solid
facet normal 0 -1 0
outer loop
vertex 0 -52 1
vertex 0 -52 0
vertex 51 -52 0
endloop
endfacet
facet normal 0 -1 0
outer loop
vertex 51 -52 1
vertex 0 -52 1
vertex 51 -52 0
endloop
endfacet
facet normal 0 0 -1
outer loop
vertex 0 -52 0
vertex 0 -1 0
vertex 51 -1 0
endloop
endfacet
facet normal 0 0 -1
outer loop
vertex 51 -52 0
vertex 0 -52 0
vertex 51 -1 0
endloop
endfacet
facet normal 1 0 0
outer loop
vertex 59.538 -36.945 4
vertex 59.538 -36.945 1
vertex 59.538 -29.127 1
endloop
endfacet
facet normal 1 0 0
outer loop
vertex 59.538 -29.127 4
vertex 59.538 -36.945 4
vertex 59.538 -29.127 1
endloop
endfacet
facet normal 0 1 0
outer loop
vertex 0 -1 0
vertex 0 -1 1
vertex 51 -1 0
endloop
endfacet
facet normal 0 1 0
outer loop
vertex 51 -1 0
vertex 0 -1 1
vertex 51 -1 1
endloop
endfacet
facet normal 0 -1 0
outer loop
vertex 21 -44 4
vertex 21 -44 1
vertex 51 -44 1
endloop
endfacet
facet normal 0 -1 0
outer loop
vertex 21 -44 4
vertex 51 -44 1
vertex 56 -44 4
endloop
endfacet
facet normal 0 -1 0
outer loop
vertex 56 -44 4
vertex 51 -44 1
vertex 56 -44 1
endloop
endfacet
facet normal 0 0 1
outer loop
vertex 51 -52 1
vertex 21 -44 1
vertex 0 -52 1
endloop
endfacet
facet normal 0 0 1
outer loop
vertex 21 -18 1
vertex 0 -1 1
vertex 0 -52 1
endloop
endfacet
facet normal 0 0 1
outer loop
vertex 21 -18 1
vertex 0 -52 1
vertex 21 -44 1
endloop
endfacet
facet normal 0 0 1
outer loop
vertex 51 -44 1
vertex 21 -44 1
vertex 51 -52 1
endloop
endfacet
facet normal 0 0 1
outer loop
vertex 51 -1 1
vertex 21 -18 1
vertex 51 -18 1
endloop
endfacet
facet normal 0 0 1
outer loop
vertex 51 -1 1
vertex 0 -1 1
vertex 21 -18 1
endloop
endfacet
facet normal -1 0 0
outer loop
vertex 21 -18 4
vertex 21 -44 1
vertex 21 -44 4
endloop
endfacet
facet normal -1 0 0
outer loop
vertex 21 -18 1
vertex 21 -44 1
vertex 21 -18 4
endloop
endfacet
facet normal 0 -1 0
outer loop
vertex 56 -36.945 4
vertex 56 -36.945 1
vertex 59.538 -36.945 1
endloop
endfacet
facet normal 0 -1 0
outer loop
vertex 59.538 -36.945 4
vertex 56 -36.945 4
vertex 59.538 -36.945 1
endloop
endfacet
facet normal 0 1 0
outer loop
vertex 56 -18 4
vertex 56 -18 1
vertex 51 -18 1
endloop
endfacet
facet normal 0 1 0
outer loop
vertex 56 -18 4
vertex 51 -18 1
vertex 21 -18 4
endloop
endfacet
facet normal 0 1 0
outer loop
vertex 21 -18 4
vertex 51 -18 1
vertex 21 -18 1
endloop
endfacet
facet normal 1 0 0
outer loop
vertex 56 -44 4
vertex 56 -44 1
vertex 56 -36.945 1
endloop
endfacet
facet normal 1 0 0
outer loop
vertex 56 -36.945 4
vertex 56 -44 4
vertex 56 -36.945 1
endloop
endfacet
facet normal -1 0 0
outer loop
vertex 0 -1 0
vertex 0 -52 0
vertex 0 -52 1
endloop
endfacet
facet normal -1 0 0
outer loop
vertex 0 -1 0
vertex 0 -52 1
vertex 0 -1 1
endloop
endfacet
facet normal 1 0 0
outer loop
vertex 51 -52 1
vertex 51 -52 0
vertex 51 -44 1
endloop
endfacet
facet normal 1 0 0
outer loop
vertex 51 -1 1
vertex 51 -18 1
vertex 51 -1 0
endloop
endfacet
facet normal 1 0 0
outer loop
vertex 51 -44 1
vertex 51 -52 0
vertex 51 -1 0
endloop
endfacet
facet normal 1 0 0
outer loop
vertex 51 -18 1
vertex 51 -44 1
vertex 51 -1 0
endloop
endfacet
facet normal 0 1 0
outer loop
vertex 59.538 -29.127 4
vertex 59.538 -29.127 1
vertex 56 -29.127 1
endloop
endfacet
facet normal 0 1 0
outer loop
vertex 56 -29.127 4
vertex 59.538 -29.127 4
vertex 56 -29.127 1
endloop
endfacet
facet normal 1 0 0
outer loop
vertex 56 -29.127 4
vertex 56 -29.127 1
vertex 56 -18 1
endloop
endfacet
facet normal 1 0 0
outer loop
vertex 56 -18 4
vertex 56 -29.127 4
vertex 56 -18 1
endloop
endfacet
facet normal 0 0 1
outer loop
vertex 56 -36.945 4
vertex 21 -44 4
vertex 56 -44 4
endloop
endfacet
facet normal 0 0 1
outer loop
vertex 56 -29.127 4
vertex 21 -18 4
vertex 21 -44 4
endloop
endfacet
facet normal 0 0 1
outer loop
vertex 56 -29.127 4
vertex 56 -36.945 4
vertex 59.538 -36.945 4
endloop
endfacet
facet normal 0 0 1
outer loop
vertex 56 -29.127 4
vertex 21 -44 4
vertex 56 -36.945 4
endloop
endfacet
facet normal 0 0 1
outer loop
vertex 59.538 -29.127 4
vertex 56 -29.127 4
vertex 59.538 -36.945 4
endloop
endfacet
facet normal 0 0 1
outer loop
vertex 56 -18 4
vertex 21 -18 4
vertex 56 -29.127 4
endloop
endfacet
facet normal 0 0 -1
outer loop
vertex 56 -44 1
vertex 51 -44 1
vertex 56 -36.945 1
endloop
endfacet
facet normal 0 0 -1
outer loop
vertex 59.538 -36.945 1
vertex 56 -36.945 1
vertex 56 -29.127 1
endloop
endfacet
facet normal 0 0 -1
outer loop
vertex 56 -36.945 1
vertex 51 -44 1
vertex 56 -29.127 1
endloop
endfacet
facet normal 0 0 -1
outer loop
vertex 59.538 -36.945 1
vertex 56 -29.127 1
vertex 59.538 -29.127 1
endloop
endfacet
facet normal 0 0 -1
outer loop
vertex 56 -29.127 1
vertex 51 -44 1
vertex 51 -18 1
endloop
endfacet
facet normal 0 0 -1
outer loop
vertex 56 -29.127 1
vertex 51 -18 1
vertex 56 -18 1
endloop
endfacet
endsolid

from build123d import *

# Parameters (mm, degrees)
CROQUIS1_W              = 51
CROQUIS1_H              = 52
SALIENTE_EXTRUIR1_DEPTH = 1
CROQUIS2_W              = 30
CROQUIS2_H              = 26
CROQUIS2_W_2            = 3.538114814
CROQUIS2_H_2            = 7.817941565
CROQUIS2_W_3            = 2.595962414
SALIENTE_EXTRUIR2_DEPTH = 3
CROQUIS3_W              = 51
CROQUIS3_H              = 1
CORTAR_EXTRUIR2_DEPTH   = 3


with BuildPart() as part:
    # Croquis1 → Saliente-Extruir1 (new body)
    with BuildSketch(Plane.XY):
        with Locations((25.5, -26)):
            Rectangle(CROQUIS1_W, CROQUIS1_H)
    extrude(amount=SALIENTE_EXTRUIR1_DEPTH)

    # Croquis2 → Saliente-Extruir2 (add)
    with BuildSketch(Plane.XY.offset(1)):
        with Locations((36, -31)):
            Rectangle(CROQUIS2_W, CROQUIS2_H)
        with Locations((57.769057407, -33.036147408)):
            Rectangle(CROQUIS2_W_2, CROQUIS2_H_2)
        with Locations((54.702018793, -33.036147408)):
            Rectangle(CROQUIS2_W_3, CROQUIS2_H_2)
        Polygon((56, -18), (51, -18), (51, -44), (56, -44), (56, -36.945118191), (53.404037586, -36.945118191), (53.404037586, -29.127176626), (56, -29.127176626), align=None)
    extrude(amount=SALIENTE_EXTRUIR2_DEPTH)

    # Croquis3 → Cortar-Extruir2 (cut)
    with BuildSketch(Plane.XY.offset(1)):
        with Locations((25.5, -0.5)):
            Rectangle(CROQUIS3_W, CROQUIS3_H)
    extrude(amount=-CORTAR_EXTRUIR2_DEPTH, mode=Mode.SUBTRACT)


solid = part.part
